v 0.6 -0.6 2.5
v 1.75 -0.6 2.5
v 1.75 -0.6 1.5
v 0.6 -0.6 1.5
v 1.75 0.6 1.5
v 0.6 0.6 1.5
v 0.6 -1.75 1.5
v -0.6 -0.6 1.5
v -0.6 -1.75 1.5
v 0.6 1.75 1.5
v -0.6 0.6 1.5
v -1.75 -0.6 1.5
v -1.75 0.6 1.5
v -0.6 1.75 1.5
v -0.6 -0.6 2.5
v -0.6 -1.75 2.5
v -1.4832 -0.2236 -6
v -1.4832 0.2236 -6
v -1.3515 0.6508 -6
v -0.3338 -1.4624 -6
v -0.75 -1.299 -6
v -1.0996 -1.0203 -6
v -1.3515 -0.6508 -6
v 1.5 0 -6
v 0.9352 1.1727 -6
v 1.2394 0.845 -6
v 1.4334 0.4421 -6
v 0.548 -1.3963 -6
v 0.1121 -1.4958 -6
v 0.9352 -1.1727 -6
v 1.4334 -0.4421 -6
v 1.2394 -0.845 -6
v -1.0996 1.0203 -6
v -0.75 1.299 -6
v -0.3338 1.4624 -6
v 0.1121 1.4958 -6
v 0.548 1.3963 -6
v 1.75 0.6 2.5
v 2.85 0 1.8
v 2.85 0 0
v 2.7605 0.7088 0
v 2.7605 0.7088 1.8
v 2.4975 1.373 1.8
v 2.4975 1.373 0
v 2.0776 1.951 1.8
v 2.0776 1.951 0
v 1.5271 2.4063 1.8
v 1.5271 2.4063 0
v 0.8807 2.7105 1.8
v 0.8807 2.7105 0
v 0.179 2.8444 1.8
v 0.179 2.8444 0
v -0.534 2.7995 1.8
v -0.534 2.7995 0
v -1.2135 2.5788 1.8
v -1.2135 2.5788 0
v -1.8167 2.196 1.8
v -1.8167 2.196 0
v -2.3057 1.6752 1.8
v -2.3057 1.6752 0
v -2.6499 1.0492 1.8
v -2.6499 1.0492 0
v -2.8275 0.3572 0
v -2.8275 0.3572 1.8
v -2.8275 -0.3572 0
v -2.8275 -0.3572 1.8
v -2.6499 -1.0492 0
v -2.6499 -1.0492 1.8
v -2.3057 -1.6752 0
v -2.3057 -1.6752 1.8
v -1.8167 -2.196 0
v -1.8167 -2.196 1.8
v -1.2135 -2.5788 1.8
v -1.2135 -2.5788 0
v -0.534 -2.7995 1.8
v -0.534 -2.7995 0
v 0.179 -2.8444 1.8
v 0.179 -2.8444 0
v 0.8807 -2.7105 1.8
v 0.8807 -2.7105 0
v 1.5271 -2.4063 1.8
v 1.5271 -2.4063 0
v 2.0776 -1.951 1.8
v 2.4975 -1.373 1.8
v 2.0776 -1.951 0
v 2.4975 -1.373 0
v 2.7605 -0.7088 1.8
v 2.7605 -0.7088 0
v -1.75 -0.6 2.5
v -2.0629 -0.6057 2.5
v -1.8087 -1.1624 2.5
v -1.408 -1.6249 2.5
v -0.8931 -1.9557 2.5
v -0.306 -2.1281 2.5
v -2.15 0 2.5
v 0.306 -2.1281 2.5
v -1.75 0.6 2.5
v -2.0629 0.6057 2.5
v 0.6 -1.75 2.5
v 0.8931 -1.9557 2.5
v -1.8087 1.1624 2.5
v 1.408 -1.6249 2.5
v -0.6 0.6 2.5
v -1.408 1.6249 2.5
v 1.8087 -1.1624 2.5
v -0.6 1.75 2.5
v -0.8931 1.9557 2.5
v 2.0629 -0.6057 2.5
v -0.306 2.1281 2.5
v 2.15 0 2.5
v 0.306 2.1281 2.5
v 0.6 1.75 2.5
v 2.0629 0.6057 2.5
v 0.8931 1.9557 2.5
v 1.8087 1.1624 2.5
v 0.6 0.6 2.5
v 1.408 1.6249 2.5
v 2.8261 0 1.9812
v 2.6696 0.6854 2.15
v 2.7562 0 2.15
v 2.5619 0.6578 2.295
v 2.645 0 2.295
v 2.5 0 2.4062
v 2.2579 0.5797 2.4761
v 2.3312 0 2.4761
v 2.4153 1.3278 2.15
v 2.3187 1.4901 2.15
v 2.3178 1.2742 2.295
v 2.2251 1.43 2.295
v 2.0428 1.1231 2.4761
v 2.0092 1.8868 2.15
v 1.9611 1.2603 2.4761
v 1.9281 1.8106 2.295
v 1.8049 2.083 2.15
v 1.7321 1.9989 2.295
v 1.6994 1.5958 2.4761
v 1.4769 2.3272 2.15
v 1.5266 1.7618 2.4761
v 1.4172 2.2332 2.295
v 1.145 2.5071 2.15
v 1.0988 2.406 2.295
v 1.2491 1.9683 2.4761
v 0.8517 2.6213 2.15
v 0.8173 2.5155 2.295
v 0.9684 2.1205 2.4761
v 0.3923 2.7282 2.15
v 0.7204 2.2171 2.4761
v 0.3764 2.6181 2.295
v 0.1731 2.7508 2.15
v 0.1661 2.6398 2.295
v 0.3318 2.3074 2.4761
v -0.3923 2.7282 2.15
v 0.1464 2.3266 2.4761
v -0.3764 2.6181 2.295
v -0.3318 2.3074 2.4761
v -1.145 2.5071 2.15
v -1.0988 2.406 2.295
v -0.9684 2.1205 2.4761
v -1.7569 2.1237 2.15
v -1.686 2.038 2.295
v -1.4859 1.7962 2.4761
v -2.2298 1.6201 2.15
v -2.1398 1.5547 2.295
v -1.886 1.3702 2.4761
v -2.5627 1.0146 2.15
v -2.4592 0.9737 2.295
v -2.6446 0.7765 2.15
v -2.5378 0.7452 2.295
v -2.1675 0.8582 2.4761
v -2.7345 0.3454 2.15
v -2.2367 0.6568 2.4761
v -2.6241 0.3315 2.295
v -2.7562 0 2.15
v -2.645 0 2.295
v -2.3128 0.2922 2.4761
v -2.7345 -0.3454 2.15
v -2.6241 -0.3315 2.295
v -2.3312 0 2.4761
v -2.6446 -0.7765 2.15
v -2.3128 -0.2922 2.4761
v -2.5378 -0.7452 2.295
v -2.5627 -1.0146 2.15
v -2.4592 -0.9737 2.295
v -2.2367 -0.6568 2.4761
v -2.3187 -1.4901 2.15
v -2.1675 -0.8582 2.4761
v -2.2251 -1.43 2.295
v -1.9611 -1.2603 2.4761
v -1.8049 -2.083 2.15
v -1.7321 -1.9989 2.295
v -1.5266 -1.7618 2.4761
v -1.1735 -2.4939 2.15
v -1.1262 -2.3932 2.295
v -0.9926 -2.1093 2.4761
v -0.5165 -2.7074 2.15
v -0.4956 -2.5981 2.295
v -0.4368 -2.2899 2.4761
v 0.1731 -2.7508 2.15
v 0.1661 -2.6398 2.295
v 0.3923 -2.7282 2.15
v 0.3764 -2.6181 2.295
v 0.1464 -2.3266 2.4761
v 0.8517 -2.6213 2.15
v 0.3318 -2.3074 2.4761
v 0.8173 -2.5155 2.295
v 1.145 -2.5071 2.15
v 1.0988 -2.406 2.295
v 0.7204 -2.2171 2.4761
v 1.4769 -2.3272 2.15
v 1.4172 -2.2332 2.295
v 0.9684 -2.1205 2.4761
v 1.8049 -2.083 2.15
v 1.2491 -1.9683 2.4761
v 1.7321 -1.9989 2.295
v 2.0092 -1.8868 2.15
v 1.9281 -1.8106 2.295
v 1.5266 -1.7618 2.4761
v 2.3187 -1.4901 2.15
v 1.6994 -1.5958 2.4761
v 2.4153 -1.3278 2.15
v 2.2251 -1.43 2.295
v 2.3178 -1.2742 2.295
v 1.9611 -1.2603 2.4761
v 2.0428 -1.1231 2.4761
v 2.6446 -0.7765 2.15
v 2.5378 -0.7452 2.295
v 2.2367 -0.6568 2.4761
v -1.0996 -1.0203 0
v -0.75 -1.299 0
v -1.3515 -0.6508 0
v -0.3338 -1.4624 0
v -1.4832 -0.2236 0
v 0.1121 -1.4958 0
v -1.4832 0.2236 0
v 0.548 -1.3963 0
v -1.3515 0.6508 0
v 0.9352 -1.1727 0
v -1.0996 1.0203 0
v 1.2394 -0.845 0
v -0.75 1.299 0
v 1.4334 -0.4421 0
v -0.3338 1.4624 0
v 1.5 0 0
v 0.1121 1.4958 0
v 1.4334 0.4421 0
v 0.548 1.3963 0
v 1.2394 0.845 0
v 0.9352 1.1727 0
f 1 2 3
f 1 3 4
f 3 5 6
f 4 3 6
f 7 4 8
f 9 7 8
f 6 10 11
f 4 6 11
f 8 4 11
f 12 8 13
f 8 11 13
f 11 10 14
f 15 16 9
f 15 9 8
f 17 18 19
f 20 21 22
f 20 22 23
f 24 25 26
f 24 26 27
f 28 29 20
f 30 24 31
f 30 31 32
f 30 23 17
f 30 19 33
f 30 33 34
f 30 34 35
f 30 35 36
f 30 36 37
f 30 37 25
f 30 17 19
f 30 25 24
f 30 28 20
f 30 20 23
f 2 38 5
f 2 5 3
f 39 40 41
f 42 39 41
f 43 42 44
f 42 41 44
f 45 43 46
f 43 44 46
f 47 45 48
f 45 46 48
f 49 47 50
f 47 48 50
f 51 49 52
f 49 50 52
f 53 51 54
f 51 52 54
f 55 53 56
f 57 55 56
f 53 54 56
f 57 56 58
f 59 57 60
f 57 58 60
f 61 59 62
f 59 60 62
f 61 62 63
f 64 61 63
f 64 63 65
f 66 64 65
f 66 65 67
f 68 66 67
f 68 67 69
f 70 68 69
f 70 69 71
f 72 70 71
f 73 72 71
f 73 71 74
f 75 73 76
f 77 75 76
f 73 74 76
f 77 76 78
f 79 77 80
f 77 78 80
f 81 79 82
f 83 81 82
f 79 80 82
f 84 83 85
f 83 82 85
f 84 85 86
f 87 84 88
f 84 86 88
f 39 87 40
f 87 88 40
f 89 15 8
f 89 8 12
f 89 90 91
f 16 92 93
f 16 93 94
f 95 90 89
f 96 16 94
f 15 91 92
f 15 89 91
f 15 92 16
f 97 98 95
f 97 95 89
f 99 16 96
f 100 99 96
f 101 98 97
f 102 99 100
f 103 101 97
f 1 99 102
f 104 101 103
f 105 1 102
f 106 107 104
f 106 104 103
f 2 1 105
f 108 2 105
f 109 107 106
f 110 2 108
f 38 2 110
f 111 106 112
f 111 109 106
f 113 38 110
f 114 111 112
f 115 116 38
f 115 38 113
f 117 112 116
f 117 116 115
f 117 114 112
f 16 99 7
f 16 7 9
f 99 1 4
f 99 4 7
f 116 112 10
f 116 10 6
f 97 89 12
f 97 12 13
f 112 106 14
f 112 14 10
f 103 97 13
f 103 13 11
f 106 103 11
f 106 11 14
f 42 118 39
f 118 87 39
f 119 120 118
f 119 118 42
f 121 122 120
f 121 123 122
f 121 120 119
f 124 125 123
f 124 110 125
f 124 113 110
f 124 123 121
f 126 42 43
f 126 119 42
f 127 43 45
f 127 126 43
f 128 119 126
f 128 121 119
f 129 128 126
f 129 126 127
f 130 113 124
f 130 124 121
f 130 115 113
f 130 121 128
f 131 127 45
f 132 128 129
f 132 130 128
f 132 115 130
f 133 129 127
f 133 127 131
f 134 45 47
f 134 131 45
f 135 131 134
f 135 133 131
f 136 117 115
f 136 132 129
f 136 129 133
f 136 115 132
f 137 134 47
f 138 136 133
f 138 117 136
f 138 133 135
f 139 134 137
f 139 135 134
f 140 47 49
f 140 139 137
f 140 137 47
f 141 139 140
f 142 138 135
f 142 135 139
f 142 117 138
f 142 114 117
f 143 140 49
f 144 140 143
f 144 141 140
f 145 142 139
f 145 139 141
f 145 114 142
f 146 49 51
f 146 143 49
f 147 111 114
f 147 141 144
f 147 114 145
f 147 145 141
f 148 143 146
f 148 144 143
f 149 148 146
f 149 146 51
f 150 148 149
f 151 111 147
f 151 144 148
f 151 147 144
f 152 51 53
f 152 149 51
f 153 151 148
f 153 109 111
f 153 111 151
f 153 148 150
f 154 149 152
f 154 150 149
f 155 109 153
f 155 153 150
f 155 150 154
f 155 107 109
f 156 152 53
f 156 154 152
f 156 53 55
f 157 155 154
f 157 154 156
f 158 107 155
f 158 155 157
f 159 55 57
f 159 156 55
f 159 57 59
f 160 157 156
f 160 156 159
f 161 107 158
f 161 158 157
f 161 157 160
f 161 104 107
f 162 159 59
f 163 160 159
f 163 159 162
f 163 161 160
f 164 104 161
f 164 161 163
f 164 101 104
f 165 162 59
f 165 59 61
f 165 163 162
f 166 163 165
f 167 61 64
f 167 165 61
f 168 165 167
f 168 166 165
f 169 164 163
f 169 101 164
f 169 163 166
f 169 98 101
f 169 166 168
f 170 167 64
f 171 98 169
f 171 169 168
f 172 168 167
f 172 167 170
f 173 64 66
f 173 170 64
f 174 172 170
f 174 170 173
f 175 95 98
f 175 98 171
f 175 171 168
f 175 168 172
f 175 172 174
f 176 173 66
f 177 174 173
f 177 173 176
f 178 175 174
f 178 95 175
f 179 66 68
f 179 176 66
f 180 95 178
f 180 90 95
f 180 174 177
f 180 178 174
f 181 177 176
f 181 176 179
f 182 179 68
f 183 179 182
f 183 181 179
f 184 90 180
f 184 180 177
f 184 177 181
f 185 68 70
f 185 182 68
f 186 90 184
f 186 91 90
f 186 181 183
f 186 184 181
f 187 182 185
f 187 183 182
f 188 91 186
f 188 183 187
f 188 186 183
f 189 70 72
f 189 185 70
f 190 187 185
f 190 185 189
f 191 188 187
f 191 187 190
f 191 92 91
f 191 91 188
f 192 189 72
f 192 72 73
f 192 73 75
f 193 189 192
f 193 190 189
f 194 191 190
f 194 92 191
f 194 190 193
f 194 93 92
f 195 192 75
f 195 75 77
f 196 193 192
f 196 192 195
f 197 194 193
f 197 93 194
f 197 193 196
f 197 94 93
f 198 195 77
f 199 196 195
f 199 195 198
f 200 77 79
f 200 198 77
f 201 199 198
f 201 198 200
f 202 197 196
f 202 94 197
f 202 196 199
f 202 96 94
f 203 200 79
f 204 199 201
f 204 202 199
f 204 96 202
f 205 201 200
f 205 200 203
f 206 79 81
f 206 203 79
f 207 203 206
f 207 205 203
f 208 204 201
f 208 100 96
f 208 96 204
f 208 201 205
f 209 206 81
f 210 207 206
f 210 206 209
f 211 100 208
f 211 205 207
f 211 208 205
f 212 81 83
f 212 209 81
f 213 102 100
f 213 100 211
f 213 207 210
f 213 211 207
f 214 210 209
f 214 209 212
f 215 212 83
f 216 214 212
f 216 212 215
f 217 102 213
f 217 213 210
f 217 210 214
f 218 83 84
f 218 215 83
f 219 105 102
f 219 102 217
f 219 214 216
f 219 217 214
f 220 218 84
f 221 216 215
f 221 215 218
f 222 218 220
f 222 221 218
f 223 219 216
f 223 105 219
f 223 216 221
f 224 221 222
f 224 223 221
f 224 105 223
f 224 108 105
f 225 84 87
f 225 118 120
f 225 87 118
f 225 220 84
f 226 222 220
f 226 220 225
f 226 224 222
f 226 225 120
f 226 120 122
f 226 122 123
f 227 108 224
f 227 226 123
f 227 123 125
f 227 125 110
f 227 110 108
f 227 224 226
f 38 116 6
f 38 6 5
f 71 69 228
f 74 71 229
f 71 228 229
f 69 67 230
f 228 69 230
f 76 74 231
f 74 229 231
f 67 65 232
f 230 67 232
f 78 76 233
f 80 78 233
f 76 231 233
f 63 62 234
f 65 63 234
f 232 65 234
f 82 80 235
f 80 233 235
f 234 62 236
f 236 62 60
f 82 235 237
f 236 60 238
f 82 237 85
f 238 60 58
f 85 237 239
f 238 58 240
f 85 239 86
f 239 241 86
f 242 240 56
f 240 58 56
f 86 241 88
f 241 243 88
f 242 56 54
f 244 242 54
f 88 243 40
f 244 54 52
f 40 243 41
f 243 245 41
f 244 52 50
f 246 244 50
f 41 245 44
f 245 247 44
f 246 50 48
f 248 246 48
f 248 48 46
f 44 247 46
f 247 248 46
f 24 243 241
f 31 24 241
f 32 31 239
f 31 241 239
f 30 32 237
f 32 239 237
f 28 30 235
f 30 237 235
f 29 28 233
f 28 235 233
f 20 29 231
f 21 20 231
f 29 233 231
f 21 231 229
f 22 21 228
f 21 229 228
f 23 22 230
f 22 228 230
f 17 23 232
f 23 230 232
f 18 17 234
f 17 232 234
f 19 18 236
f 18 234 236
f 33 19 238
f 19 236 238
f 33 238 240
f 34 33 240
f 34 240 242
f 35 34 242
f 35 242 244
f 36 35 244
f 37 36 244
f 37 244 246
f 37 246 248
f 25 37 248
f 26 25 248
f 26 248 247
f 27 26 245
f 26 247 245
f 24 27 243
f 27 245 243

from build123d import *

# Parameters (mm, degrees)
SKETCH_R     = 2.85
PAD_DEPTH    = 2.5
POCKET_DEPTH = 1
FILLET_R     = 0.7
SKETCH002_R  = 1.5
PAD001_DEPTH = 6


with BuildPart() as part:
    # Sketch → Pad (new body)
    with BuildSketch(Plane.XY):
        Circle(SKETCH_R)
    extrude(amount=PAD_DEPTH)

    # Sketch001 (on Face3 of Pad) → Pocket (cut)
    with BuildSketch(Plane.XY.offset(2.5)):
        Polygon((-0.6, 1.75), (0.6, 1.75), (0.6, 0.6), (1.75, 0.6), (1.75, -0.6), (0.6, -0.6), (0.6, -1.75), (-0.6, -1.75), (-0.6, -0.6), (-1.75, -0.6), (-1.75, 0.6), (-0.6, 0.6), align=None)
    extrude(amount=-POCKET_DEPTH, mode=Mode.SUBTRACT)

    # Fillet
    fillet_edges = [part.edges().sort_by_distance(p)[0] for p in [
        (-2.85, 0, 2.5),
    ]]
    fillet(fillet_edges, radius=FILLET_R)

    # Sketch002 (on Face3 of Fillet) → Pad001 (join)
    with BuildSketch(Plane(origin=(0, 0, 0), x_dir=(1, 0, 0), z_dir=(0, 0, -1))):
        Circle(SKETCH002_R)
    extrude(amount=PAD001_DEPTH)


solid = part.part
